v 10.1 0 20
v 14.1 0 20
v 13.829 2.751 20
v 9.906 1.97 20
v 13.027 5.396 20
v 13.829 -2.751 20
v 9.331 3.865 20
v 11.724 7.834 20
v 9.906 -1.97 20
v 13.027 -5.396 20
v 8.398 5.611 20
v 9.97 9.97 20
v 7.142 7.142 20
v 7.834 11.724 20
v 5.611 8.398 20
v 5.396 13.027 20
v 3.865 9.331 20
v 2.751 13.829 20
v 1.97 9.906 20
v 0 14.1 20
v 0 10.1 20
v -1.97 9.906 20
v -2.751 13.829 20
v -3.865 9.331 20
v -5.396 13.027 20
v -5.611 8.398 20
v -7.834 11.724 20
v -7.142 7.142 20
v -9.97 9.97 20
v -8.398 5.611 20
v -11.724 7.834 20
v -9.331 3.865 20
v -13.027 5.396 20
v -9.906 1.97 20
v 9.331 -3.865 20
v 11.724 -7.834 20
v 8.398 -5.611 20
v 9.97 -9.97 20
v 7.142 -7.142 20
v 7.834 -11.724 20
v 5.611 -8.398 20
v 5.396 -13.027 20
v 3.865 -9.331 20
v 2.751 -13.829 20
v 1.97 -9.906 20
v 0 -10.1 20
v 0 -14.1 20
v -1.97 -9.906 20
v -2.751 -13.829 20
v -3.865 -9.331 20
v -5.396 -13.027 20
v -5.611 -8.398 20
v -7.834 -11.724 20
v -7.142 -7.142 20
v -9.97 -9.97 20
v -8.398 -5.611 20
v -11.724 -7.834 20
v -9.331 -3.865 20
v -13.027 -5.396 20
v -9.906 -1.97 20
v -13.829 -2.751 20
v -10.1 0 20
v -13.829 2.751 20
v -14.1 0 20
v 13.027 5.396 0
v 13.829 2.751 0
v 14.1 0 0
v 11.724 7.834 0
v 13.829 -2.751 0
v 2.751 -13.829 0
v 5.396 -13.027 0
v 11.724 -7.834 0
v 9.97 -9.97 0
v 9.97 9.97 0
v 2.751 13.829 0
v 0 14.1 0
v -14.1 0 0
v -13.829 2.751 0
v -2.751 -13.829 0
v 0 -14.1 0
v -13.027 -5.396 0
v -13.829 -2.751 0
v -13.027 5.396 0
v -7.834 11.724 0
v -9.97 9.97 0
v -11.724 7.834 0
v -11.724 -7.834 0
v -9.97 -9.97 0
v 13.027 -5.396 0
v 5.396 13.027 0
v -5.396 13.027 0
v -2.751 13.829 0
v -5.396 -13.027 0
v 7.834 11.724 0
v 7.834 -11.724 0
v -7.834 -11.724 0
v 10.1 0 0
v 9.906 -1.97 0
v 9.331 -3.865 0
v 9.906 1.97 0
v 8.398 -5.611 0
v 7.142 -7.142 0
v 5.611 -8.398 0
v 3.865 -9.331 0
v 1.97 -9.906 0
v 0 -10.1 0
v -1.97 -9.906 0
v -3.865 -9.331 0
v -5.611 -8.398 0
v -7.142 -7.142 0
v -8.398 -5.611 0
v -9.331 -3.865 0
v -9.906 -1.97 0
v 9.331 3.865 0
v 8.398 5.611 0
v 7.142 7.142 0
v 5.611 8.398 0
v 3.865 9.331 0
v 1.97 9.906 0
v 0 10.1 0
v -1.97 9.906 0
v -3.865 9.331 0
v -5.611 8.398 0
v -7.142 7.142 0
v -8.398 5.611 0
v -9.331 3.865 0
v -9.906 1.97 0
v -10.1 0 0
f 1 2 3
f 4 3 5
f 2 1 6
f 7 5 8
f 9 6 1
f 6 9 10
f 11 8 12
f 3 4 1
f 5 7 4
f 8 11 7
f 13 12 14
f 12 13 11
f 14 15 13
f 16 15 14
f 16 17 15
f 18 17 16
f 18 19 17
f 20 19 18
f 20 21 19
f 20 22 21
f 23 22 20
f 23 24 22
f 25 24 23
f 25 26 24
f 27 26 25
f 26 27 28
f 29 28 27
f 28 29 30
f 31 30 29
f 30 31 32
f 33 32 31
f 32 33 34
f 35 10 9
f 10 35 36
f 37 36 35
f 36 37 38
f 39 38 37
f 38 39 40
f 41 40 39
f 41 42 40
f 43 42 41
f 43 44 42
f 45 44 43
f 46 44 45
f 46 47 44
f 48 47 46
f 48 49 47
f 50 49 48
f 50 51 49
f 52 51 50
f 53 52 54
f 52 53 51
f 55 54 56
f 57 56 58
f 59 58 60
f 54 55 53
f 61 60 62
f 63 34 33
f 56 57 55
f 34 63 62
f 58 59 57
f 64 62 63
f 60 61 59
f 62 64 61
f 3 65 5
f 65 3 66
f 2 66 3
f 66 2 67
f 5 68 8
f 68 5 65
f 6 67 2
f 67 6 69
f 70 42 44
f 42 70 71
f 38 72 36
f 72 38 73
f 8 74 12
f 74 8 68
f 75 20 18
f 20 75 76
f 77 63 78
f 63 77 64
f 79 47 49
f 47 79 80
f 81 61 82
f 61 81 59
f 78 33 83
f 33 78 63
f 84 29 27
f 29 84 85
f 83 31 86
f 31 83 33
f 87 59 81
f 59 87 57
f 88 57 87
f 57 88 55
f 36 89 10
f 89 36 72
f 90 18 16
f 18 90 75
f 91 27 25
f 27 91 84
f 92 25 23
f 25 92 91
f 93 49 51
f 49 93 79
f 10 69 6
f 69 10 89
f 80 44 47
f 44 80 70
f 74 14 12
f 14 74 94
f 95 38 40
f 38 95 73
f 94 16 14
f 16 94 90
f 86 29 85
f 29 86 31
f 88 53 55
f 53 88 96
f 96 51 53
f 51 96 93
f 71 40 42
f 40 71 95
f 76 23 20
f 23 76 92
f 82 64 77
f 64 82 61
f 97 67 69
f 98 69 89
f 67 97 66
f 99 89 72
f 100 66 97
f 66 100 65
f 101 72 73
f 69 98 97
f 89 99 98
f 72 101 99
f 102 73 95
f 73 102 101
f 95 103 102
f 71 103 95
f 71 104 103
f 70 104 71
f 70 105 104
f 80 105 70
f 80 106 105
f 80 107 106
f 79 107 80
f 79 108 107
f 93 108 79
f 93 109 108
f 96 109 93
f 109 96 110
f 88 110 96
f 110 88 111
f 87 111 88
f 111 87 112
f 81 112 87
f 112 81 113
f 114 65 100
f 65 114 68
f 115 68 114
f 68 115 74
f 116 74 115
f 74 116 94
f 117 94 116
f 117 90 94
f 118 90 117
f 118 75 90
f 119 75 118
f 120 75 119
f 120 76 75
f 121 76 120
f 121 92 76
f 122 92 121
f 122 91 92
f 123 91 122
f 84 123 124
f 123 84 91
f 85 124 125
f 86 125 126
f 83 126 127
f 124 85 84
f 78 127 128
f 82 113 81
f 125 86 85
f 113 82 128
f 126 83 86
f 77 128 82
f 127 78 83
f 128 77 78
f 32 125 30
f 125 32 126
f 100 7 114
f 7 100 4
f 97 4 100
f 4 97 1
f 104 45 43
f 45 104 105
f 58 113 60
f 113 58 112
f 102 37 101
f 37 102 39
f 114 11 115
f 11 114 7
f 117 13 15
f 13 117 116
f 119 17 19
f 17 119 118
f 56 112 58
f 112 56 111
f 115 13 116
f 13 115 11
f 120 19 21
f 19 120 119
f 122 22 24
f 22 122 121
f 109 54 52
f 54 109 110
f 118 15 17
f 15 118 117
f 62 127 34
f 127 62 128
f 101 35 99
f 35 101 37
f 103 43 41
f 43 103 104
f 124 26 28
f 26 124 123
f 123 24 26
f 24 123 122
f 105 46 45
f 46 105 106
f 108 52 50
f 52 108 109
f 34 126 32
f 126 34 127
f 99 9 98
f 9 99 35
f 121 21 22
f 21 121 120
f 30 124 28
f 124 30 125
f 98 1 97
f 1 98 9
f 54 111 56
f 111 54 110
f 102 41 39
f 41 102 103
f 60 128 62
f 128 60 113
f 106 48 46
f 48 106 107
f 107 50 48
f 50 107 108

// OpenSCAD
$fn = 32;

// ----------------------------------------------------------------------
// Spacer sleeve: 28.2 / 20.2 x 20 mm
// ----------------------------------------------------------------------

// --- parameters (mm) ---
sleeve_od = 28.2;         // outside diameter
sleeve_id = 20.2;         // shaft bore
sleeve_l = 20;            // sleeve length

module sleeve() {
  cylinder(h = sleeve_l, d = sleeve_od);
}

difference() {
  sleeve();
  translate([0, 0, -1]) cylinder(h = sleeve_l + 2, d = sleeve_id);
}
